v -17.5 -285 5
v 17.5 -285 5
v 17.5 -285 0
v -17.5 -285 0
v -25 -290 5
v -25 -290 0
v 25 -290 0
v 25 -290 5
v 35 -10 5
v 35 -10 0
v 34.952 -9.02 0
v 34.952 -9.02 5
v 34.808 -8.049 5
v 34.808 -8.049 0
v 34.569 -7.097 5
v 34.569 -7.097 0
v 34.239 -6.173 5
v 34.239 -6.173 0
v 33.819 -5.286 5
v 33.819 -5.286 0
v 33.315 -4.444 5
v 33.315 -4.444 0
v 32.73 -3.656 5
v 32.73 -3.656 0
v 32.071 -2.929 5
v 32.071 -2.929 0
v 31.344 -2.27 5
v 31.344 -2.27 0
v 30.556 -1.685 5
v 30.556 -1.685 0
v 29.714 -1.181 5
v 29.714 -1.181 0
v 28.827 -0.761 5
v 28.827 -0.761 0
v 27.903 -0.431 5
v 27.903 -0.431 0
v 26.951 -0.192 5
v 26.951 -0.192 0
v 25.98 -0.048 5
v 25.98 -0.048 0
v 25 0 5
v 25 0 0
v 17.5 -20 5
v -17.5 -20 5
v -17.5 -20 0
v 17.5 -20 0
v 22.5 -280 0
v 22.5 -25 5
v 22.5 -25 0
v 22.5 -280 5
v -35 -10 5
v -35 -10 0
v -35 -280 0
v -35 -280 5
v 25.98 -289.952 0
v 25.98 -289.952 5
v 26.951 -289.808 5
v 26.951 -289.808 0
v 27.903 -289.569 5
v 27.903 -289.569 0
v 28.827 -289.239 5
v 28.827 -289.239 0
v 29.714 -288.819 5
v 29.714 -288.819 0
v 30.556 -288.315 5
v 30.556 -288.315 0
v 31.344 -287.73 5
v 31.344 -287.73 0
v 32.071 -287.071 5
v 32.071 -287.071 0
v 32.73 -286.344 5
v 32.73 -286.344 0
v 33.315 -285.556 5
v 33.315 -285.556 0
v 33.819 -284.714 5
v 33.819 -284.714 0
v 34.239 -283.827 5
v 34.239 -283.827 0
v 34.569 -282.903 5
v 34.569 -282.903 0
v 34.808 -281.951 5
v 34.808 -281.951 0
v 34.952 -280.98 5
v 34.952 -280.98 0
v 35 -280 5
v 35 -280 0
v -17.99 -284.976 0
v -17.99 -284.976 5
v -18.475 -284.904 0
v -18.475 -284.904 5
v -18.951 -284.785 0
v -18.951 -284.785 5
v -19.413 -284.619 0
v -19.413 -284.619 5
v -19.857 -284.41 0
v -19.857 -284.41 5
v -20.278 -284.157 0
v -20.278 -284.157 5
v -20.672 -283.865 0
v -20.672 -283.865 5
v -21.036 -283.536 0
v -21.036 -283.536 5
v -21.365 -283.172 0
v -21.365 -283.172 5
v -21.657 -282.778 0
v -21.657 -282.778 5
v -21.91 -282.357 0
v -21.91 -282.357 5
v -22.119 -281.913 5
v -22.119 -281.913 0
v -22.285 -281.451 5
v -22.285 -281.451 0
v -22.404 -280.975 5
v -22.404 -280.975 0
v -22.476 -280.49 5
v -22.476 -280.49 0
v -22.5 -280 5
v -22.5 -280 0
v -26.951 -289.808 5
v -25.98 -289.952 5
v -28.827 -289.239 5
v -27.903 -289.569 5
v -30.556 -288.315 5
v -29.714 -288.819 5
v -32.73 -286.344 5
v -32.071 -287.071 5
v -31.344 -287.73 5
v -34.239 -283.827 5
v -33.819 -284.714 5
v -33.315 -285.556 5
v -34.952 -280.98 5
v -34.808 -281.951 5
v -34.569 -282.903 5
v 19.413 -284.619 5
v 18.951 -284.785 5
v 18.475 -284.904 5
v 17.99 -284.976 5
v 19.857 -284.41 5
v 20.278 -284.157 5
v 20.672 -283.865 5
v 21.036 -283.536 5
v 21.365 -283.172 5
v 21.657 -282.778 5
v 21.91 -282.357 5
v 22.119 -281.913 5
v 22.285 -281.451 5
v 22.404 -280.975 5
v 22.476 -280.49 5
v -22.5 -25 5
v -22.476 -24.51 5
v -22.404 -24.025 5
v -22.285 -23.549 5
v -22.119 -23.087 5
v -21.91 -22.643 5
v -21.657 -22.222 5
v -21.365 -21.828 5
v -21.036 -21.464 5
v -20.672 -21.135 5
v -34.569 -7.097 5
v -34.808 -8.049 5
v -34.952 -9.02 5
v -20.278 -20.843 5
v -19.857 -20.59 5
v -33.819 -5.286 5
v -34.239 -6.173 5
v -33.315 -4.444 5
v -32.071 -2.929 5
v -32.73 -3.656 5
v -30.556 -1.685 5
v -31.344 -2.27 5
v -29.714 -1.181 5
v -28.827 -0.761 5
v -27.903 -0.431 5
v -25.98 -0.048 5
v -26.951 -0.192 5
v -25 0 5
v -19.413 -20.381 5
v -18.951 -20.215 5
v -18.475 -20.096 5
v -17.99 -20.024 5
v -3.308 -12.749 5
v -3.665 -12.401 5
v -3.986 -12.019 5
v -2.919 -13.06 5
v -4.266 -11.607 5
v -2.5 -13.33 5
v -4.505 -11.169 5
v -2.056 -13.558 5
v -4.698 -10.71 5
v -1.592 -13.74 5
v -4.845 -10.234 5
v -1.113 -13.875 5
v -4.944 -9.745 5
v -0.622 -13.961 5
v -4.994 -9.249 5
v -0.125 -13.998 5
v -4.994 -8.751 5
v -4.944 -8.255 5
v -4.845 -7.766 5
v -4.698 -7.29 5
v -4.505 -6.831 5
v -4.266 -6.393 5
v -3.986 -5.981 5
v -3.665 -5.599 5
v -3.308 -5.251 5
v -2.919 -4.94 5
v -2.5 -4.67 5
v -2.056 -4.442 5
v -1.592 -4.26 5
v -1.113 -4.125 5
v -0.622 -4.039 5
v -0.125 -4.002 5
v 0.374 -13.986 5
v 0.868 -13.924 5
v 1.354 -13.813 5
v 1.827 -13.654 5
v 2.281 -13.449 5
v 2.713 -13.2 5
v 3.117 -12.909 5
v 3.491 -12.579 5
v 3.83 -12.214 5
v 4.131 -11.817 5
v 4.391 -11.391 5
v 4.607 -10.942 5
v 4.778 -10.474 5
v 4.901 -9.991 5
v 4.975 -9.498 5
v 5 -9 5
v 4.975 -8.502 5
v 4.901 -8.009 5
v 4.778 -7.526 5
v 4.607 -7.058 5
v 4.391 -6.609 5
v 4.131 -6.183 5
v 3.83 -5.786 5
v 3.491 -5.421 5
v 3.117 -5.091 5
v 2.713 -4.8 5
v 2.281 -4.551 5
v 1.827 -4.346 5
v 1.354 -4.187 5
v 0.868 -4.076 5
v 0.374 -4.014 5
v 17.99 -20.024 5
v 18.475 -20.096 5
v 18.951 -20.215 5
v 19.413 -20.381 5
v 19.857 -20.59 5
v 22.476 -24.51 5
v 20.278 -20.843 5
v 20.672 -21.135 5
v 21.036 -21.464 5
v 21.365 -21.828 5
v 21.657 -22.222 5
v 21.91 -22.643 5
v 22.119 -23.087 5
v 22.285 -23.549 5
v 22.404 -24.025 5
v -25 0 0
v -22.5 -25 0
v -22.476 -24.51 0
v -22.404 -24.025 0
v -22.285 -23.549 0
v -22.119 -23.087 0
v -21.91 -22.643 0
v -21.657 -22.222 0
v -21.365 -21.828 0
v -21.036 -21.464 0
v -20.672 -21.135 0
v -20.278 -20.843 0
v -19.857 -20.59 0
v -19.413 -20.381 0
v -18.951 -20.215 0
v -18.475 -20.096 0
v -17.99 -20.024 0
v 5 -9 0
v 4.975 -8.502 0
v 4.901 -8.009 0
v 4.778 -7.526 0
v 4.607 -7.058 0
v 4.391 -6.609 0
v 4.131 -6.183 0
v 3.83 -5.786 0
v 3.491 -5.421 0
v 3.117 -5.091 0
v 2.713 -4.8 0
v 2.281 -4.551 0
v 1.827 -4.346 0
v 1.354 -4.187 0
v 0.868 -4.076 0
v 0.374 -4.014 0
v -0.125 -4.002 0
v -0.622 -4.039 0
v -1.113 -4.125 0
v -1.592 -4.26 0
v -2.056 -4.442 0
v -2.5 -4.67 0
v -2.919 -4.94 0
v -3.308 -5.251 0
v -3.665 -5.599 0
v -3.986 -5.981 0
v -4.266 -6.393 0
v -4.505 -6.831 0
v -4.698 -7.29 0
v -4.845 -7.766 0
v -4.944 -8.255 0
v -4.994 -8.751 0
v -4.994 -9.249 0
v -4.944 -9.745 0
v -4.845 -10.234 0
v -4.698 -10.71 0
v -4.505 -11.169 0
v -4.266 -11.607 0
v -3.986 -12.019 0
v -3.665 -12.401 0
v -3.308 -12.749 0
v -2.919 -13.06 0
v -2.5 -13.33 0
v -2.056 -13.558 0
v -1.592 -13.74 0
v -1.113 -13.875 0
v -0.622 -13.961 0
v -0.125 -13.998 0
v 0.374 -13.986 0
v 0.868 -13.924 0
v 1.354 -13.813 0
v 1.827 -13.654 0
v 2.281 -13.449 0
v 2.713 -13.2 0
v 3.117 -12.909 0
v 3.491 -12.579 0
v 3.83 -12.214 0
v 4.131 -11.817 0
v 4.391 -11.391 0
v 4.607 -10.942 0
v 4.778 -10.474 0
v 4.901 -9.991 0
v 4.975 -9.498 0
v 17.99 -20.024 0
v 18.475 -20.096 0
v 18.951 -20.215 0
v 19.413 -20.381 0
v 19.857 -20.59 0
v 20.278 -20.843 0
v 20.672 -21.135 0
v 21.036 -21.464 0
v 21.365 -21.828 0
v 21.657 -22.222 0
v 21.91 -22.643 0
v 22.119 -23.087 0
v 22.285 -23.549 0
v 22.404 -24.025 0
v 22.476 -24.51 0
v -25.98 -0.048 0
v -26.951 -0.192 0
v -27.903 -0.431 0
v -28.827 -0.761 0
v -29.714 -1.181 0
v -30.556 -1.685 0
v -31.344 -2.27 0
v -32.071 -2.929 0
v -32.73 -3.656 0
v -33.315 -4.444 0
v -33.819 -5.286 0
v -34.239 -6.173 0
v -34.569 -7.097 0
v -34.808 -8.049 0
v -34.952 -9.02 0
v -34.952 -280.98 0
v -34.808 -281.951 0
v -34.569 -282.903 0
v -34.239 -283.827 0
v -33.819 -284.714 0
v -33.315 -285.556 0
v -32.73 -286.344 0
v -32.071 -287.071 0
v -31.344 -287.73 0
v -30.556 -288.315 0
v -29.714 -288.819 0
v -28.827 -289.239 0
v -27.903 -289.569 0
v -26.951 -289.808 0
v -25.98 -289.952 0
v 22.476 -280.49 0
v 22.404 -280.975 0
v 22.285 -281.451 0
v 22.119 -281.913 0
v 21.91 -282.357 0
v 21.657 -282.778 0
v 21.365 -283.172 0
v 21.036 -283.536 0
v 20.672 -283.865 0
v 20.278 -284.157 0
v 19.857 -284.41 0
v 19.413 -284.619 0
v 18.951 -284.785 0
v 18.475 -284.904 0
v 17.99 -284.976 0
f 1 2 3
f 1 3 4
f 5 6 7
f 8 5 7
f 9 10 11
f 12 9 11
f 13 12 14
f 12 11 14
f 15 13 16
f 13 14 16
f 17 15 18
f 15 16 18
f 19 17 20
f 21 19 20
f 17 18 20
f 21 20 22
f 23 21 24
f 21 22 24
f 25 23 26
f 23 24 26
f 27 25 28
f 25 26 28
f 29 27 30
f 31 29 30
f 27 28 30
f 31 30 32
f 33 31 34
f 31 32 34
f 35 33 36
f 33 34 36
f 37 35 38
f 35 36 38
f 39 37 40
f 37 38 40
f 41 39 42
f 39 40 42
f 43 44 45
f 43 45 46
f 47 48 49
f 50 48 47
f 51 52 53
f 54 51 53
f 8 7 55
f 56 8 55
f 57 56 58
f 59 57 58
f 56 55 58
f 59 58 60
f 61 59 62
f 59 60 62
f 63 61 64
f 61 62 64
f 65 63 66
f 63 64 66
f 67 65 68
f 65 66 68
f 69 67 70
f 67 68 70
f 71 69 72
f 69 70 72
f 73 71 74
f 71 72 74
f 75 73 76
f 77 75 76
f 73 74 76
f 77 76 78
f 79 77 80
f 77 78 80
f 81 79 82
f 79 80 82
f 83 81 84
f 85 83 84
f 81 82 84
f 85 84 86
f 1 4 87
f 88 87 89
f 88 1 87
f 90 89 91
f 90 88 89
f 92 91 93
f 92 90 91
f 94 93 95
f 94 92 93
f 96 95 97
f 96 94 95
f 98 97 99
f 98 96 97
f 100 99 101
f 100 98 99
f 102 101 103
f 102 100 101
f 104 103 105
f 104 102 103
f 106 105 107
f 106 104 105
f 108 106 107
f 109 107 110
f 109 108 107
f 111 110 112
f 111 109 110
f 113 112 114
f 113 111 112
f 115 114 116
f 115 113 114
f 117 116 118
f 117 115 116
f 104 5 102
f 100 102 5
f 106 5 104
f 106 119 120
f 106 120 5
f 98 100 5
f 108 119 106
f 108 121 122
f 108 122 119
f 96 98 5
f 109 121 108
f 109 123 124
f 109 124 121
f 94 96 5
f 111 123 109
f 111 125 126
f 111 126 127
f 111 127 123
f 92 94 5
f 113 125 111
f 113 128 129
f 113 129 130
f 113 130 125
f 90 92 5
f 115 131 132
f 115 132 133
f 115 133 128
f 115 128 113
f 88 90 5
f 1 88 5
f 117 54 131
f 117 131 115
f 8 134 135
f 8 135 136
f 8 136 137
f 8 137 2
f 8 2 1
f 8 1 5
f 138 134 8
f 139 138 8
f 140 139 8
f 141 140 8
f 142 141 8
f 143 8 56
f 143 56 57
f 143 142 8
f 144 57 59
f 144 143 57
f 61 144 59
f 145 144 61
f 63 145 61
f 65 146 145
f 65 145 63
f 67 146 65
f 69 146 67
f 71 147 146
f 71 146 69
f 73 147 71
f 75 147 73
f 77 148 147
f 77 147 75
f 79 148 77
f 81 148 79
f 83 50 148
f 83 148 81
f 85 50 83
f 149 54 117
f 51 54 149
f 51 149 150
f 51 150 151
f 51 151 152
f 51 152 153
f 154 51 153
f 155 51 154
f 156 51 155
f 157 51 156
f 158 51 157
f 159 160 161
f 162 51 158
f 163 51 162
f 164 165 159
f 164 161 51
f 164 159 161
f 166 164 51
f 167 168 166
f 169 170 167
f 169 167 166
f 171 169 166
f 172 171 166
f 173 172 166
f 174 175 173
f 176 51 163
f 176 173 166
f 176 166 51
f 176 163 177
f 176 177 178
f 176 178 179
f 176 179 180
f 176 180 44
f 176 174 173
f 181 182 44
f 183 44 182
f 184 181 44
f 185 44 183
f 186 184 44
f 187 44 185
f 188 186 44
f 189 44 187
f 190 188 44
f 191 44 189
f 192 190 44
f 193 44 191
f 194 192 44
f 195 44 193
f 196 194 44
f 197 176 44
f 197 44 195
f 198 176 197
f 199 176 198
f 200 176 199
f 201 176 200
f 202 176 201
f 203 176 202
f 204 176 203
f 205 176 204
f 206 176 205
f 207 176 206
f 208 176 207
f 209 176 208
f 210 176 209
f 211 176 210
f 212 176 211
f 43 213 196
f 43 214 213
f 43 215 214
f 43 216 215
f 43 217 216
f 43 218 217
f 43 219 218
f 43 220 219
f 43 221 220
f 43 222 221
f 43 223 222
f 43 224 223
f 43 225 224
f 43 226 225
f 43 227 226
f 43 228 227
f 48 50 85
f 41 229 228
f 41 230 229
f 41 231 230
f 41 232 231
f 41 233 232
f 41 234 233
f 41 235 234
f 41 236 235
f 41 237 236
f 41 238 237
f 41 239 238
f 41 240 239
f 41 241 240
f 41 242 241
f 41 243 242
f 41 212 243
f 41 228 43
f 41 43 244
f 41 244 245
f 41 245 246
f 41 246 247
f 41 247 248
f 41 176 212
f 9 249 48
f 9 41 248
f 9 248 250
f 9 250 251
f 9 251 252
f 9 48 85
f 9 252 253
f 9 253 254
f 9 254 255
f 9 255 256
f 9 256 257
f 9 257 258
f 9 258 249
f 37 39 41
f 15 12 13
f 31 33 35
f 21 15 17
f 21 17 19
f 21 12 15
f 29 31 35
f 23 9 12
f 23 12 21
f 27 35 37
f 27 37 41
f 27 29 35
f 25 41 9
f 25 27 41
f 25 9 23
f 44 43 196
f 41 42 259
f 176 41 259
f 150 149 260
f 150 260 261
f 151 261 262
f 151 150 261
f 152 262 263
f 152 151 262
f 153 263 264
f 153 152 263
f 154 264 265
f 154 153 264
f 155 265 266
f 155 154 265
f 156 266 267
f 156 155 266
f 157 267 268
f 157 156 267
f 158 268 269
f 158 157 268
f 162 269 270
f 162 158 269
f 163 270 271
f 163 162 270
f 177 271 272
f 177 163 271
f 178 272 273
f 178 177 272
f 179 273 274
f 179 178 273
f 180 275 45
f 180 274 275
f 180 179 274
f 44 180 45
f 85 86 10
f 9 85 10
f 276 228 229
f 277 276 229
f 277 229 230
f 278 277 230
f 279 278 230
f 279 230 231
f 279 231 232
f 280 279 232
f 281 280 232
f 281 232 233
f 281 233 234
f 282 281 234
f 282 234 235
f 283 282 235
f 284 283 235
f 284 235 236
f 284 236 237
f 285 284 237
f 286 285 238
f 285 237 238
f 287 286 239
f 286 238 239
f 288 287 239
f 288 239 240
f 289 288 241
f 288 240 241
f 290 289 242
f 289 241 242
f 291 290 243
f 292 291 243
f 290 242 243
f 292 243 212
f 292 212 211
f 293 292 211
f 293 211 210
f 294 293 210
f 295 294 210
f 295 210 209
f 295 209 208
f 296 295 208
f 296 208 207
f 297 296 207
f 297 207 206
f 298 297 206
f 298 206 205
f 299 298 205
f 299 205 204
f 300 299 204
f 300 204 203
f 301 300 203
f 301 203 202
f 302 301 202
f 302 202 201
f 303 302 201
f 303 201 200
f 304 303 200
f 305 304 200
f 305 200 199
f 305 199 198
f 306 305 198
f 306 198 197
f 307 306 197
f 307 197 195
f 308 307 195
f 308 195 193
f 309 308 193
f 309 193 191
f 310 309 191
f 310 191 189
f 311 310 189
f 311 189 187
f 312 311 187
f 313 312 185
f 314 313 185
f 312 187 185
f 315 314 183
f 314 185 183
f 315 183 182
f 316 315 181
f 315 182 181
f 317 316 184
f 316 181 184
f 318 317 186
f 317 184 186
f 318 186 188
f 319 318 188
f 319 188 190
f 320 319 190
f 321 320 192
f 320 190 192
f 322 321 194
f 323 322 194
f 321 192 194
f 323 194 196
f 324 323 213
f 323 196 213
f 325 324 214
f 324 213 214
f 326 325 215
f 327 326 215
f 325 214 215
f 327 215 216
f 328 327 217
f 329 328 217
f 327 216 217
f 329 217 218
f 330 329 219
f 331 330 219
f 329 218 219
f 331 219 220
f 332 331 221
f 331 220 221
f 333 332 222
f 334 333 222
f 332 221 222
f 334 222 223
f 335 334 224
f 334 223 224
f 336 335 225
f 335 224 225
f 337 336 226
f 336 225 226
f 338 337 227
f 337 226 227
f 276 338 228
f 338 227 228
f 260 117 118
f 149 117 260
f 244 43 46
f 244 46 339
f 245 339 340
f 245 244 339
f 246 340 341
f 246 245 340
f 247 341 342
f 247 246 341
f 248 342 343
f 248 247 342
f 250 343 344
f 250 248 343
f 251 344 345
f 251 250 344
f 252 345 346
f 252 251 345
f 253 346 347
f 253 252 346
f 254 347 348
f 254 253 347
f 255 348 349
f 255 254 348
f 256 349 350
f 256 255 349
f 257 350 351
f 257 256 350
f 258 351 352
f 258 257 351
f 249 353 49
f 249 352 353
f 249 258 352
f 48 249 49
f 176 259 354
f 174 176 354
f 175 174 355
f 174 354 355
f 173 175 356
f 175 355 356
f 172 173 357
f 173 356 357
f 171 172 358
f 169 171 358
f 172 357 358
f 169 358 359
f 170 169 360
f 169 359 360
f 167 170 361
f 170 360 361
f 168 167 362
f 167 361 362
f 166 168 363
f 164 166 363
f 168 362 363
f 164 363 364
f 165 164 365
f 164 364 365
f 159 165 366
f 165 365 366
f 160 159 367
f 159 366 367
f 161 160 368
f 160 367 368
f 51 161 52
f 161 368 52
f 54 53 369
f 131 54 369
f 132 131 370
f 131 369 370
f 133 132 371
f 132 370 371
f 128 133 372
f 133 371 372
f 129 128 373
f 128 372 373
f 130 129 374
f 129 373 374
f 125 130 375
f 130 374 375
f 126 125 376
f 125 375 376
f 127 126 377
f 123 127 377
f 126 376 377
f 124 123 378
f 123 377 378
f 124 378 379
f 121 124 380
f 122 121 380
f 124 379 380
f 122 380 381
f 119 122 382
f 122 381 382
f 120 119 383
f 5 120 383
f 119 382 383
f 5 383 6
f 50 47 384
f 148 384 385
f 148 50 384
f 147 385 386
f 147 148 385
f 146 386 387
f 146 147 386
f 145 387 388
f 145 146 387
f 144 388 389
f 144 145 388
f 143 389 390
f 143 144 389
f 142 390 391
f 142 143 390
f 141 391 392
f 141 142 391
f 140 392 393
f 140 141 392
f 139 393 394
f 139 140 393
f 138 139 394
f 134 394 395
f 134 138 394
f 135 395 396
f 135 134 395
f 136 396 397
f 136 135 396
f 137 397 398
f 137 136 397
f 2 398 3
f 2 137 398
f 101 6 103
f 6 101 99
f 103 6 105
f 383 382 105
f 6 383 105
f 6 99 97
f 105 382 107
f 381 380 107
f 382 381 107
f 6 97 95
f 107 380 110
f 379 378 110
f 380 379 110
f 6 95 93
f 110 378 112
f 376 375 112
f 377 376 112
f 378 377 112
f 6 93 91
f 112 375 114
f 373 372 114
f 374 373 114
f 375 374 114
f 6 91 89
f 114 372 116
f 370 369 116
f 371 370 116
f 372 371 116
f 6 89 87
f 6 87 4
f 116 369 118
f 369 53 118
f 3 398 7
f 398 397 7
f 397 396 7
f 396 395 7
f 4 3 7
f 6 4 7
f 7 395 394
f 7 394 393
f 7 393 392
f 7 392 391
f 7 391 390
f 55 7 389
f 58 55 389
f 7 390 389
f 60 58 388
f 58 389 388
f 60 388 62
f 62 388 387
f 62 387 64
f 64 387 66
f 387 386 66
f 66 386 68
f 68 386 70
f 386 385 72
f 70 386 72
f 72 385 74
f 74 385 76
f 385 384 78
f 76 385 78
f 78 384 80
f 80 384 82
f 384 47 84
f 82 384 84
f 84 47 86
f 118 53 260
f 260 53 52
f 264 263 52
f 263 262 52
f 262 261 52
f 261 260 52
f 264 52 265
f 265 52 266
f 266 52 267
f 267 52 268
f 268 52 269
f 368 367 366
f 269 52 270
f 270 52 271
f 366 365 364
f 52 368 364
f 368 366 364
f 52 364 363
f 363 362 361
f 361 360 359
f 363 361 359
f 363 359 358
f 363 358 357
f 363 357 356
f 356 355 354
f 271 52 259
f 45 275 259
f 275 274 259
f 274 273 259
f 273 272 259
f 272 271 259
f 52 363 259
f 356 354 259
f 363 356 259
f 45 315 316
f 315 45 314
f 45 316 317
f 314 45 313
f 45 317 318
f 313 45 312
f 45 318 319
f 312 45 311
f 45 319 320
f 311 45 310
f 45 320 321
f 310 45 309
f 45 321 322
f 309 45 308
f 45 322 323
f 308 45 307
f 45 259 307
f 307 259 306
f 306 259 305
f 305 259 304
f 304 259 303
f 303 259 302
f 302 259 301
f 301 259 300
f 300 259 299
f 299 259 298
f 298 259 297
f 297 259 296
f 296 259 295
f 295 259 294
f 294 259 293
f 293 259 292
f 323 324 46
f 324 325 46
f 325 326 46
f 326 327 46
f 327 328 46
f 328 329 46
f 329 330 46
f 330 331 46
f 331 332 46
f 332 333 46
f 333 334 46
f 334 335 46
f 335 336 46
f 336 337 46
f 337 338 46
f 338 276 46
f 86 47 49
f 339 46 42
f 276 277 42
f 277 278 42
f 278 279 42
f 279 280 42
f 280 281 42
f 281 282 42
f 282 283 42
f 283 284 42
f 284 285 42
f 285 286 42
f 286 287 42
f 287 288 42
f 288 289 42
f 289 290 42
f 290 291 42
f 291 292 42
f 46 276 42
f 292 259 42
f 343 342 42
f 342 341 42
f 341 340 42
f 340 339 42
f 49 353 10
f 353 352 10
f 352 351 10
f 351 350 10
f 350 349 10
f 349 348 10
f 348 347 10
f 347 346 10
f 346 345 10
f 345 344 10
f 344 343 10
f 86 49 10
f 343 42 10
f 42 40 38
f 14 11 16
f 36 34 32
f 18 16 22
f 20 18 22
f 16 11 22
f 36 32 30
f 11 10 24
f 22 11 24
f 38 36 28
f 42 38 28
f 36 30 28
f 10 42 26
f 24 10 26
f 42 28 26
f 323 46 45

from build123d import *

# Parameters (mm, degrees)
BOSS_EXTRUDE3_DEPTH = 5
SKETCH6_R           = 5
CUT_EXTRUDE1_DEPTH  = 6


with BuildPart() as part:
    # Sketch4 → Boss-Extrude3 (new body)
    with BuildSketch(Plane.XY):
        with BuildLine():
            Line((-25, -290), (25, -290))
            ThreePointArc((25, -290), (32.071067812, -287.071067812), (35, -280))
            Line((35, -280), (35, -10))
            ThreePointArc((35, -10), (32.071067812, -2.928932188), (25, 0))
            Line((25, 0), (-25, 0))
            ThreePointArc((-25, 0), (-32.071067812, -2.928932188), (-35, -10))
            Line((-35, -10), (-35, -280))
            ThreePointArc((-35, -280), (-32.071067812, -287.071067812), (-25, -290))
        make_face()
    extrude(amount=BOSS_EXTRUDE3_DEPTH)

    # Sketch6 → Cut-Extrude1 (cut, through all)
    with BuildSketch(Plane.XY.offset(5)):
        with Locations((0, -9)):
            Circle(SKETCH6_R)
        with BuildLine():
            Line((-17.5, -20), (17.5, -20))
            ThreePointArc((17.5, -20), (21.035533906, -21.464466094), (22.5, -25))
            Line((22.5, -25), (22.5, -280))
            ThreePointArc((22.5, -280), (21.035533906, -283.535533906), (17.5, -285))
            Line((17.5, -285), (-17.5, -285))
            ThreePointArc((-17.5, -285), (-21.035533906, -283.535533906), (-22.5, -280))
            Line((-22.5, -280), (-22.5, -25))
            ThreePointArc((-22.5, -25), (-21.035533906, -21.464466094), (-17.5, -20))
        make_face()
    extrude(amount=-CUT_EXTRUDE1_DEPTH, mode=Mode.SUBTRACT)


solid = part.part
